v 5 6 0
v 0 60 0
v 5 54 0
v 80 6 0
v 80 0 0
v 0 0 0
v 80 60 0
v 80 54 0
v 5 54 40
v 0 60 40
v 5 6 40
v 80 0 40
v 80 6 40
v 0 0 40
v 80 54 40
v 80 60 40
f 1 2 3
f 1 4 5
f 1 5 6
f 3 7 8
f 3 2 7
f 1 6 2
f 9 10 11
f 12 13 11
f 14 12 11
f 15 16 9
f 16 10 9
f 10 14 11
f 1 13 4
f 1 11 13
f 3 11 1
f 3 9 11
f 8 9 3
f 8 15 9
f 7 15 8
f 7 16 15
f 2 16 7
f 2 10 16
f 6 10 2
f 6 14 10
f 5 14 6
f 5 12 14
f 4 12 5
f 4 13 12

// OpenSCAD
$fn = 32;

// ----------------------------------------------------------------------
// Structural section: channel 80 x 60 mm
// ----------------------------------------------------------------------

// --- parameters (mm) ---
sec_w = 80;               // channel width, X
sec_h = 60;               // channel height, Y
flange_t = 6;             // flange thickness
web_t = 5;                // web thickness
plate_t = 40;             // cut length, Z (extrusion height)

profile = [[0, 0], [80, 0], [80, 6], [5, 6], [5, 54], [80, 54], [80, 60], [0, 60]];  // primary outline, 8 points, counter clockwise

// --- the one profile operation ---
linear_extrude(height = plate_t) polygon(points = profile);
